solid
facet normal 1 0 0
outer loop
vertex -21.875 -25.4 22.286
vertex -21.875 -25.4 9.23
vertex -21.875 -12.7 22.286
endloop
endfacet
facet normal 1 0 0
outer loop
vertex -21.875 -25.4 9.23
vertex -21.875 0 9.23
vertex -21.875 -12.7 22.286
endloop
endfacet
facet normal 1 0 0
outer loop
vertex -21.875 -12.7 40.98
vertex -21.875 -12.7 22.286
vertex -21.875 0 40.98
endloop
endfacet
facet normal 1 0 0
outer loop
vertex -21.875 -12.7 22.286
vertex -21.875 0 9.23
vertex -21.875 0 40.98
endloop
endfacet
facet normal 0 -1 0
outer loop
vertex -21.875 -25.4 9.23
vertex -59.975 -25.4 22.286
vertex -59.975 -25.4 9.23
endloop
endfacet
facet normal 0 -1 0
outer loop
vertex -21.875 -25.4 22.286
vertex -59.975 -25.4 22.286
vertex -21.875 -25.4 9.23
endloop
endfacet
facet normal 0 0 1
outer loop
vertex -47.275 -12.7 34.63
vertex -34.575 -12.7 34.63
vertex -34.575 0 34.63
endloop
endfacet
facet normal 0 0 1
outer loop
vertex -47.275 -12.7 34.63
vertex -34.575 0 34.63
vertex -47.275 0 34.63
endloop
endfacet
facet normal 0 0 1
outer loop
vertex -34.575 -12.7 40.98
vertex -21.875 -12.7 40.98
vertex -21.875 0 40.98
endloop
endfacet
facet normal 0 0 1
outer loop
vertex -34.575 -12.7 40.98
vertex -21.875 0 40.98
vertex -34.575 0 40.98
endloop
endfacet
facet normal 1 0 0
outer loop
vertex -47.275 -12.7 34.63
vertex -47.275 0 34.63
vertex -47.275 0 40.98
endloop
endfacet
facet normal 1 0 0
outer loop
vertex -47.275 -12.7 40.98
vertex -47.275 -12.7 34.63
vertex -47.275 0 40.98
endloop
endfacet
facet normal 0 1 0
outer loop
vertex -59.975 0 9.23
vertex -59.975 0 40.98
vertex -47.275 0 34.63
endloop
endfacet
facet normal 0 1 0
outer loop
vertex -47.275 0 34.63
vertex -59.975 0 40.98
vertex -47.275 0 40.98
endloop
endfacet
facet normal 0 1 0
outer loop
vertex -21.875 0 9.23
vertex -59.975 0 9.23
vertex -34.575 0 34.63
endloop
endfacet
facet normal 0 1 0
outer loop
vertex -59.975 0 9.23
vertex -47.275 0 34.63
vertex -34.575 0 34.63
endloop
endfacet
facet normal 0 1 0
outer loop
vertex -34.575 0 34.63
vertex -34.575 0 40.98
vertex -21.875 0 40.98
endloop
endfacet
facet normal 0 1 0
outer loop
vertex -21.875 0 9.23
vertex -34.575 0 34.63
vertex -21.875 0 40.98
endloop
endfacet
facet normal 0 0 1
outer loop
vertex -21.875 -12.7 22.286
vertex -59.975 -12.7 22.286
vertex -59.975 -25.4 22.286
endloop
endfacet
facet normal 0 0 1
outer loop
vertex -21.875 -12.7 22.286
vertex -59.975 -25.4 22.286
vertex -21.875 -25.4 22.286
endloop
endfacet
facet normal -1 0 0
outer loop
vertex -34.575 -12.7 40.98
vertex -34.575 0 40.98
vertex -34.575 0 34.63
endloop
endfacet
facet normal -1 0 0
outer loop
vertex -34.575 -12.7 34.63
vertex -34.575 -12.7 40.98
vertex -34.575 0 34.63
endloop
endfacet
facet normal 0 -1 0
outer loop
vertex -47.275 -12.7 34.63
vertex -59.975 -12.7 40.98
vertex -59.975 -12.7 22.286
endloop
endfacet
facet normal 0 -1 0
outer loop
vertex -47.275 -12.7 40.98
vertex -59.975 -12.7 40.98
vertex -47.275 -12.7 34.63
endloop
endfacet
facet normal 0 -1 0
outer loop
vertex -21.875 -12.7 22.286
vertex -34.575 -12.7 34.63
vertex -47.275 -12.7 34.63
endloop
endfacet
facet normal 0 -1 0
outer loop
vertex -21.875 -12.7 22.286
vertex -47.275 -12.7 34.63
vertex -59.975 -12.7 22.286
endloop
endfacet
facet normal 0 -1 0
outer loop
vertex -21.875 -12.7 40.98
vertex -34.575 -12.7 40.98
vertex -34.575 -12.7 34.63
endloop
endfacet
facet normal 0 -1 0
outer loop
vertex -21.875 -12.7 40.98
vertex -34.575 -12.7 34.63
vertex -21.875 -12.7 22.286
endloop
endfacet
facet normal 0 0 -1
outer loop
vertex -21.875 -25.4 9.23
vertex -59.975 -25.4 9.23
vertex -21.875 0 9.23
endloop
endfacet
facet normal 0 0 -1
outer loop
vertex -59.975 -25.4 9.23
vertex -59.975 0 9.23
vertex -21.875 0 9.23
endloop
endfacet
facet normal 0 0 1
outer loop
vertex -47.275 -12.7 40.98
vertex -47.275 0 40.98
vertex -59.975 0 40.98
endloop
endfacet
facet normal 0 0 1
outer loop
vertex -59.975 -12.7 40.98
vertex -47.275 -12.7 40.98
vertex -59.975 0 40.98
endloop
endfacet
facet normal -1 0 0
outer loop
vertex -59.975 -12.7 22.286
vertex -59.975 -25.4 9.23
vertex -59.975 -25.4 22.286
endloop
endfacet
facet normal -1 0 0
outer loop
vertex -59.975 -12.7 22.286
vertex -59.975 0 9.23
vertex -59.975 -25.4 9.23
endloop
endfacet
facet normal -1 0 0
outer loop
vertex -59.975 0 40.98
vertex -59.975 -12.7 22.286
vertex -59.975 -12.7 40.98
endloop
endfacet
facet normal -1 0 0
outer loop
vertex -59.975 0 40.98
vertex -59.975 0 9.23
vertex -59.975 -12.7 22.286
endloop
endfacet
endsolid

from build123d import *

# Parameters (mm, degrees)
F1_DEPTH = 25.4
F4_DEPTH = 12.7
F5_W     = 38.1
F5_H     = 13.0556984428
F6_DEPTH = 12.7


with BuildPart() as f1:
    # F0 (on Front) → F1 (new body)
    with BuildSketch(Plane.XZ):
        Polygon((-47.2752685128, 40.980277073), (-59.9752685128, 40.980277073), (-59.9752685128, 9.230277073), (-21.8752685128, 9.230277073), (-21.8752685128, 40.980277073), (-34.5752685128, 40.980277073), (-34.5752685128, 34.630277073), (-47.2752685128, 34.630277073), align=None)
    extrude(amount=F1_DEPTH)

    # F4 (cut): a face of the model
    f4_faces = [f1.faces().sort_by_distance(p)[0] for p in [
        (-40.9252685128, -25.4, 24.1981342159),
    ]]
    extrude(f4_faces, amount=-F4_DEPTH, mode=Mode.SUBTRACT)

    # F5 (on face) → F6 (join)
    with BuildSketch(Plane.XZ.offset(12.7)):
        with Locations((-40.9252685128, 15.7581262944)):
            Rectangle(F5_W, F5_H)
    extrude(amount=F6_DEPTH)


solid = f1.part
